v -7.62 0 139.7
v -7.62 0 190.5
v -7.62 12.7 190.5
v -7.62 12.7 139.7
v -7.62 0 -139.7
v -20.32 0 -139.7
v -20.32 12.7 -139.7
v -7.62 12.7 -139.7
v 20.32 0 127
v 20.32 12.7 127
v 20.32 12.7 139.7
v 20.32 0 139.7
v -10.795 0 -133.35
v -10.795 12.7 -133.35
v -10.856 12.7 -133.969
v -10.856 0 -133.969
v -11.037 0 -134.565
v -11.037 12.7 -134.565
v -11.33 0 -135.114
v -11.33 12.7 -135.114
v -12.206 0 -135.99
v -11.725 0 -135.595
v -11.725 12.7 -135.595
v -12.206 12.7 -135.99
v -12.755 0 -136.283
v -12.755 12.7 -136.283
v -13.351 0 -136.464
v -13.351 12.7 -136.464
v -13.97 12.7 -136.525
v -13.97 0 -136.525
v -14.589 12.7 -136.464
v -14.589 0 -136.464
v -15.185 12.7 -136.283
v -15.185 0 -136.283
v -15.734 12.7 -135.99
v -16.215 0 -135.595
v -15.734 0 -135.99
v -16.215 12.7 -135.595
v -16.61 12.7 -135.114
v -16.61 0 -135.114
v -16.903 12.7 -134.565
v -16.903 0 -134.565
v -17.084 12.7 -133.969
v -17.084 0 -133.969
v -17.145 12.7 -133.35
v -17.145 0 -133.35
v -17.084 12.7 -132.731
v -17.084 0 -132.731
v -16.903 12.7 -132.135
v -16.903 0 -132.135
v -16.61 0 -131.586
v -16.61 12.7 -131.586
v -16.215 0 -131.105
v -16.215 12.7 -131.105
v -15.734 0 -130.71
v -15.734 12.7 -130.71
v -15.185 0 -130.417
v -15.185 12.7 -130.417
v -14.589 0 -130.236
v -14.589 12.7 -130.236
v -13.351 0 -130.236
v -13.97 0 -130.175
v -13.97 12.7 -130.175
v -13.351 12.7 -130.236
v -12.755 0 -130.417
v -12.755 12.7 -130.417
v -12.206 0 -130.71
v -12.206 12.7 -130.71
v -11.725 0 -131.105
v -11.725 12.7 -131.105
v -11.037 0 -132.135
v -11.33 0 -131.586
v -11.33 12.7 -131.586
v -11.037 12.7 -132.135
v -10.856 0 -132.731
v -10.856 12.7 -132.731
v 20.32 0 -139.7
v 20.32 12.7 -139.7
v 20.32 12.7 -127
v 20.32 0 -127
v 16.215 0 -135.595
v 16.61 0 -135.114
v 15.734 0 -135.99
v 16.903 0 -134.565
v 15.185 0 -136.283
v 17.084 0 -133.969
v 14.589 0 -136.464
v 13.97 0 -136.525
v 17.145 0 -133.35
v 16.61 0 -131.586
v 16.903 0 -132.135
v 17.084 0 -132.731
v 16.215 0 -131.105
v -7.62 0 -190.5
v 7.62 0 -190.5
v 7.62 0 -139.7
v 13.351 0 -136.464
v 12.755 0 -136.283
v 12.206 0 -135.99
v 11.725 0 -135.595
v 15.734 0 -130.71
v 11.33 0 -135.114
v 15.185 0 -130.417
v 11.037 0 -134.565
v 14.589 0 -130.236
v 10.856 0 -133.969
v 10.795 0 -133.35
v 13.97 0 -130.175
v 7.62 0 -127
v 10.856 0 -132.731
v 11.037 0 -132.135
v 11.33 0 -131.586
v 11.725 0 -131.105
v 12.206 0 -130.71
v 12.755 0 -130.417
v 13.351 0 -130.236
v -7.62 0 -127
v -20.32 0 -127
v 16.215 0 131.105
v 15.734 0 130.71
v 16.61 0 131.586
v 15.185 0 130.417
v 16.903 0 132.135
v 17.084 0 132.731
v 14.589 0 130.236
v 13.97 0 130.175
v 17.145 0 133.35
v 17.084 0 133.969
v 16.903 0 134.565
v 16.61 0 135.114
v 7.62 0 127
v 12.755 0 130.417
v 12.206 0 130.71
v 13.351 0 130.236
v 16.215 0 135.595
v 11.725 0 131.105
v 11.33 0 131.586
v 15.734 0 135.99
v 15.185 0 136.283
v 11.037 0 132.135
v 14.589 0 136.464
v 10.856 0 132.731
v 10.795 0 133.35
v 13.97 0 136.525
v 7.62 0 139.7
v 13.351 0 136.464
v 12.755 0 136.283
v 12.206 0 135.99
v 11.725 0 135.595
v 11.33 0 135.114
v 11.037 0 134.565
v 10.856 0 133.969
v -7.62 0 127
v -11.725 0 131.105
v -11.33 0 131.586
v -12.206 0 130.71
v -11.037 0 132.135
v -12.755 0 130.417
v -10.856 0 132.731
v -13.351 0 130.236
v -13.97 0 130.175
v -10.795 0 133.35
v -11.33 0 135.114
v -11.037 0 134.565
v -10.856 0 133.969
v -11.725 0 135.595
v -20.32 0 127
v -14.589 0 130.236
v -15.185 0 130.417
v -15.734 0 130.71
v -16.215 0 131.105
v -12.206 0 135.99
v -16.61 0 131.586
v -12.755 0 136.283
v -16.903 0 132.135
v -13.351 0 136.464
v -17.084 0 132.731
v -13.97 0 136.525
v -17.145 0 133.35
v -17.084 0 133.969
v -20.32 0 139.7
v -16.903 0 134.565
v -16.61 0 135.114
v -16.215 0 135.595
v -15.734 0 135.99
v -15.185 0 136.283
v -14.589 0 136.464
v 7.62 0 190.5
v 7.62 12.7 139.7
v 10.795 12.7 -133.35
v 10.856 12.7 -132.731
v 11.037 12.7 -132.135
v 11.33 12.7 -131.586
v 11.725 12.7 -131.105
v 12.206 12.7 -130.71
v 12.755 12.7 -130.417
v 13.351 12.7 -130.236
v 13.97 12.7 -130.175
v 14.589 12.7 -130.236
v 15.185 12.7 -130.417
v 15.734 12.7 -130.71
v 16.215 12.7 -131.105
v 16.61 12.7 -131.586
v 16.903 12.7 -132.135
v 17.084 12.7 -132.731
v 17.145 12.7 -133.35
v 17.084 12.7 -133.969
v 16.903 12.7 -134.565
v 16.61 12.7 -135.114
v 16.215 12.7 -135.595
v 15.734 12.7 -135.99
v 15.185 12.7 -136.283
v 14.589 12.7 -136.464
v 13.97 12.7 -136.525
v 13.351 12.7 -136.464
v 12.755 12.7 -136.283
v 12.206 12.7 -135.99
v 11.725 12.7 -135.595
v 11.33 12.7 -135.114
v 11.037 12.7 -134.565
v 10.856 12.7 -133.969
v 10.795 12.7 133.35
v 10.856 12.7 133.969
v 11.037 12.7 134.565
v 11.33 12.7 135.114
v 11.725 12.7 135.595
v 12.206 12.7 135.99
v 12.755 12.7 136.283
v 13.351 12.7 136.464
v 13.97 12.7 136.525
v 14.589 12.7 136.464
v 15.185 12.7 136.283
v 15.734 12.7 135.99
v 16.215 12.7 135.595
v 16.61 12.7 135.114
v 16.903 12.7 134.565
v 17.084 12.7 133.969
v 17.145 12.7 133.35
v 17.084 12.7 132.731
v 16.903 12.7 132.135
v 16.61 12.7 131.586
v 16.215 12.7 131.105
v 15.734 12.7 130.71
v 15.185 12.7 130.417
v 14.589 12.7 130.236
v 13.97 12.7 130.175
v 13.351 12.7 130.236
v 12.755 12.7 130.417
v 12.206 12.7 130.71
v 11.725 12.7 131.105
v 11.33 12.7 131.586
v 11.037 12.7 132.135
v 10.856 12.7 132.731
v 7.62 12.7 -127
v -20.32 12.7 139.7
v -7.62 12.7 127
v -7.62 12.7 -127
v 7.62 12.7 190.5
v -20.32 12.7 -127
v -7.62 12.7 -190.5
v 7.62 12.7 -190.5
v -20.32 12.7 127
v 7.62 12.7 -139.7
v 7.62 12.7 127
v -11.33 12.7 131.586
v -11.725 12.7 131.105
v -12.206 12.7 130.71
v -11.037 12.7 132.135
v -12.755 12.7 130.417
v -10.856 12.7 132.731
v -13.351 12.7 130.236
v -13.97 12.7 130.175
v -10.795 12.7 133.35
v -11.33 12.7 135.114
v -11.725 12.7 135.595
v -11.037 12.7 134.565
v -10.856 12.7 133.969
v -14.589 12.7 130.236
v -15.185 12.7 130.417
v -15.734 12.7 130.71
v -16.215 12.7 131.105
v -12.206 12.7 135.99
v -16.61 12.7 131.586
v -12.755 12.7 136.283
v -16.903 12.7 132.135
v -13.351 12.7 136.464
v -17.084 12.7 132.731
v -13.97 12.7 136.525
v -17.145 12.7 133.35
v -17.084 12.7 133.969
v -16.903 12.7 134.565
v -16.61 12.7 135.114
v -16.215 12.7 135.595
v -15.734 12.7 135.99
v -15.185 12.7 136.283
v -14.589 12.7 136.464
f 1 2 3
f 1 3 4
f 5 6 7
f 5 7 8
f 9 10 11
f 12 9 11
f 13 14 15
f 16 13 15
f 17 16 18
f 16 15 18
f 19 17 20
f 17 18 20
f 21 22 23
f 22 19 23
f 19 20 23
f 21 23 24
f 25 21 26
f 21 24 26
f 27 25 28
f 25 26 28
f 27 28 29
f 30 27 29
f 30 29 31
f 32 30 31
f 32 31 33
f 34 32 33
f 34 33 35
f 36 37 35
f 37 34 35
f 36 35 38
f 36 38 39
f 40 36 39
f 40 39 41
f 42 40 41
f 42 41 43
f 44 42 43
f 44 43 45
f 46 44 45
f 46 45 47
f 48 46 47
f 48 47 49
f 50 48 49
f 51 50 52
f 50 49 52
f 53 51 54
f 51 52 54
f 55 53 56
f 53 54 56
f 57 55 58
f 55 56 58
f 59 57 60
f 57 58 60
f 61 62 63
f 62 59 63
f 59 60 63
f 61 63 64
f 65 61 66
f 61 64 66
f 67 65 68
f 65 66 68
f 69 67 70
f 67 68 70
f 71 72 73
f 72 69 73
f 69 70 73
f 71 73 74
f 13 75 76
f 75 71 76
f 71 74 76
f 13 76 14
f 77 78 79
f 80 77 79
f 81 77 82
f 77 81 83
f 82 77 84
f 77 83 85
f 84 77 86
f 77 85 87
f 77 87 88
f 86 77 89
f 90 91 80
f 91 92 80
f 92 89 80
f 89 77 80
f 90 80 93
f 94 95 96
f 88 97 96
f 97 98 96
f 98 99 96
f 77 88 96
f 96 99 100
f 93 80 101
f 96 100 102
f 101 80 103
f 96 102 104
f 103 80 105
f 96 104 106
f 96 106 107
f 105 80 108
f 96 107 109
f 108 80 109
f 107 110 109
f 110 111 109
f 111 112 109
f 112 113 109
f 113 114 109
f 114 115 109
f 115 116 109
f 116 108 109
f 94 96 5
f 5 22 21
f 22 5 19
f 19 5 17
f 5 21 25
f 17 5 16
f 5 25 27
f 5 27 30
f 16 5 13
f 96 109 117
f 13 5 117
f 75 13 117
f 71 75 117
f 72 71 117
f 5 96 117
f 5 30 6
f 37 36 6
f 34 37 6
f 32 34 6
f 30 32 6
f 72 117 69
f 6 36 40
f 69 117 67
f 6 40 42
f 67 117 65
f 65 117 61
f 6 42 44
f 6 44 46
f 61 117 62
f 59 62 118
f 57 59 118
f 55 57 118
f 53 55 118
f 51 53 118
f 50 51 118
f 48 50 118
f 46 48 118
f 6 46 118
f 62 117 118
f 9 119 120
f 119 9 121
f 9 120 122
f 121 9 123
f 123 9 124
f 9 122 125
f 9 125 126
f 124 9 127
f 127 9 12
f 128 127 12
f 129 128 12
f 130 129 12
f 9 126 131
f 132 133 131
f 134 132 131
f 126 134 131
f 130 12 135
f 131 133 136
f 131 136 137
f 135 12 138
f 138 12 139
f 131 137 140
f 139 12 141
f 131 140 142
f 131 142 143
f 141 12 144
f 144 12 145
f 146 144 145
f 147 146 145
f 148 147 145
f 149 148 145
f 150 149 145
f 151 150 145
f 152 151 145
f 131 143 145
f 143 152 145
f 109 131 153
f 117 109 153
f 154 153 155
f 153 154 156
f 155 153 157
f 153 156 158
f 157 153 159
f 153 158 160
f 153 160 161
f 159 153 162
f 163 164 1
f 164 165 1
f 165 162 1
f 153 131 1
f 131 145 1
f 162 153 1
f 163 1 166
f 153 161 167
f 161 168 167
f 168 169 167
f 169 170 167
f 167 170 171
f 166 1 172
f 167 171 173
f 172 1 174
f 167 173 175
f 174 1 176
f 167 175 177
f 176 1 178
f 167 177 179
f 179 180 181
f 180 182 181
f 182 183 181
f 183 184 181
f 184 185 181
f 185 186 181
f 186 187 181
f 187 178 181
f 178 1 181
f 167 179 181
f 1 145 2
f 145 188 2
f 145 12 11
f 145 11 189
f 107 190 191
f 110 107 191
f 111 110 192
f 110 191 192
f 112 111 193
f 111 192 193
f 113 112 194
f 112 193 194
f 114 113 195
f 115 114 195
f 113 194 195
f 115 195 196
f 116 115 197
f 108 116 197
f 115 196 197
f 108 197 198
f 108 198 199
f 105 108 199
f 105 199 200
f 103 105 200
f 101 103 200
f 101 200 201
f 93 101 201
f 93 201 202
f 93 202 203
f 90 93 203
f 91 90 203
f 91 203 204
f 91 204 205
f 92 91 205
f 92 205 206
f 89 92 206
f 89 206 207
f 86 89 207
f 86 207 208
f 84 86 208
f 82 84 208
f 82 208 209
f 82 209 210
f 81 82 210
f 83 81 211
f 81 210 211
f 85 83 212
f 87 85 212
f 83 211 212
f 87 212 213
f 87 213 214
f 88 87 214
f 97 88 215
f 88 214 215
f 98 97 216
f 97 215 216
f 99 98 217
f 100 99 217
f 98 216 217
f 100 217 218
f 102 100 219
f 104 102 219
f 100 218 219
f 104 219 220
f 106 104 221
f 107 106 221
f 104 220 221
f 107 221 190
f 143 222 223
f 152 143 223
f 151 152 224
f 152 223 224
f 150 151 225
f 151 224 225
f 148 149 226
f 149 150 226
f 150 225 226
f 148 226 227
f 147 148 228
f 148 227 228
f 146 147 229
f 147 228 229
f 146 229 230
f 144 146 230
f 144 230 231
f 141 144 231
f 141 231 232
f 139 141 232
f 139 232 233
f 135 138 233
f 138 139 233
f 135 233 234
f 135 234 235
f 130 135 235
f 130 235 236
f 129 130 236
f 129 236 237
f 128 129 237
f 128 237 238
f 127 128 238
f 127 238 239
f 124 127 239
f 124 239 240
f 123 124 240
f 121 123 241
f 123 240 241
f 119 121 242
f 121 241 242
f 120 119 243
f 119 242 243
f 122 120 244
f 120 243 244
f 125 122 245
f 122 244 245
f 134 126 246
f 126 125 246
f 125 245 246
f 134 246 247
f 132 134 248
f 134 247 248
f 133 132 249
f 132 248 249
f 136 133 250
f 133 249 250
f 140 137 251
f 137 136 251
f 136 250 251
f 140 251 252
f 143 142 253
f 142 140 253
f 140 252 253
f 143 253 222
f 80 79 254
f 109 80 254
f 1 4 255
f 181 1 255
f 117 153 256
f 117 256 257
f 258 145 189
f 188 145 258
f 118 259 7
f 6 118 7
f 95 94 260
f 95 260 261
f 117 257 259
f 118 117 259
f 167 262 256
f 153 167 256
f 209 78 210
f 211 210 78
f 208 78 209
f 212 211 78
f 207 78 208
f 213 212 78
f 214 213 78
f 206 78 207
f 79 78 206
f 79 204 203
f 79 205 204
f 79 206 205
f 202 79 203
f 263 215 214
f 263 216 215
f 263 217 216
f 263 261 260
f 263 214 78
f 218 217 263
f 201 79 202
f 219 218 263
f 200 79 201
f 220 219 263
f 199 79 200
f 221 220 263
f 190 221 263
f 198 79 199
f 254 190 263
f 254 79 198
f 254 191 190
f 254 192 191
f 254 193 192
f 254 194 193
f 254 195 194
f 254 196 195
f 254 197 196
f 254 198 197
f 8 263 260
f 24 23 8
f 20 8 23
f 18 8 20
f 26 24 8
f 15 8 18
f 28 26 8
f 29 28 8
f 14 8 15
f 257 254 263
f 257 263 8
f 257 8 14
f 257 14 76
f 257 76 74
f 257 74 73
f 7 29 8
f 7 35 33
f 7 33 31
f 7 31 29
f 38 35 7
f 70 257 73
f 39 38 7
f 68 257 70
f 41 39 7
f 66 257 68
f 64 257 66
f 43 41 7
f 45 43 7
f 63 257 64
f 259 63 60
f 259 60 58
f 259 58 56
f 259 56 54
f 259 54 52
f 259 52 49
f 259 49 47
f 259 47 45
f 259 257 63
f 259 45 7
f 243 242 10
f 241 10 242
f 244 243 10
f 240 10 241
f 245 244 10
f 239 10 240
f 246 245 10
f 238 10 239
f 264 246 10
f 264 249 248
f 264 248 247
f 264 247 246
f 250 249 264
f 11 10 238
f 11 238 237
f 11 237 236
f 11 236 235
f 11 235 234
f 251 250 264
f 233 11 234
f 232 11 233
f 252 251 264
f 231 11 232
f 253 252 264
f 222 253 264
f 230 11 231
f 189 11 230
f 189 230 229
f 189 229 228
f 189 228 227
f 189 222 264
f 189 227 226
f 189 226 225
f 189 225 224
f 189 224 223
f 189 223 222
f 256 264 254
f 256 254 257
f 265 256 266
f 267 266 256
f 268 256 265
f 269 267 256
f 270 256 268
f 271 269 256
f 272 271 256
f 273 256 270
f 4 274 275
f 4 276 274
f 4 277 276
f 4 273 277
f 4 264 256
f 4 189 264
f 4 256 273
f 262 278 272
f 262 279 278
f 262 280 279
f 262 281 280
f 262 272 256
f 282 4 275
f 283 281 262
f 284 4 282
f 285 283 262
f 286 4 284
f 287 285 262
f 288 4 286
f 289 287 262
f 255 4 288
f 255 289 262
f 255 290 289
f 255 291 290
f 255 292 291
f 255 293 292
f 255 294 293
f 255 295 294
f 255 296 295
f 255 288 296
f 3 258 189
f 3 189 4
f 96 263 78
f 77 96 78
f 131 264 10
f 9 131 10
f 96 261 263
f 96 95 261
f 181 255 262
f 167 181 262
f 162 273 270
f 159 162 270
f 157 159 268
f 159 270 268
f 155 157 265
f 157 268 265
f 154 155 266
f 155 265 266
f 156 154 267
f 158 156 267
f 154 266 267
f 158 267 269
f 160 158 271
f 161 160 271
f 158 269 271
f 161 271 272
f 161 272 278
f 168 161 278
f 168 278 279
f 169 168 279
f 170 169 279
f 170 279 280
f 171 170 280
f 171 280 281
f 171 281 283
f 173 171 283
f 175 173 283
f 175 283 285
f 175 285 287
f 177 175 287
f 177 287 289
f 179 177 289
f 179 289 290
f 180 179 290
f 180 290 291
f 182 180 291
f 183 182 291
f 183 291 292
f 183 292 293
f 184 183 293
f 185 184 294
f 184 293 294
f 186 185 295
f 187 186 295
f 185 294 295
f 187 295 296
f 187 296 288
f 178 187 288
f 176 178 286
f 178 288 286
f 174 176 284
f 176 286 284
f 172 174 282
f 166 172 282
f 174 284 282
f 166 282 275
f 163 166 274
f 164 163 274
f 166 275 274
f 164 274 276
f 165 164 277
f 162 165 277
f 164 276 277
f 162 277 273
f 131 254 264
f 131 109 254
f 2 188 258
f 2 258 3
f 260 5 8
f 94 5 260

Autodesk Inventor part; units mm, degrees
ref_plane "YZ Plane" through (0, 0, 0) normal (1, 0, 0) x (0, 1, 0)
ref_plane "XZ Plane" through (0, 0, 0) normal (0, 1, 0) x (-1, 0, 0)
ref_plane "XY Plane" through (0, 0, 0) normal (0, 0, 1) x (1, 0, 0)
sketch "Sketch1" plane through (0, 0, 0) normal (0, 1, 0) x (-1, 0, 0)
  line L0 (-7.62, 190.5) -> (7.62, 190.5)
  line L1 (7.62, 190.5) -> (7.62, -190.5)
  line L2 (7.62, -190.5) -> (-7.62, -190.5)
  line L3 (-7.62, -190.5) -> (-7.62, 190.5)
  line L4 (-7.62, 190.5) -> (7.62, -190.5) construction
  line L5 (7.62, 190.5) -> (-7.62, -190.5) construction
  point P0 (0, 0)
  dimension "d0" = 15.24
  dimension "d1" = 381
extrude "Extrusion1" add sketch "Sketch1" along normal blind 12.7
sketch "Sketch2" plane through (0, 12.7, 0) normal (0, 1, 0) x (1, 0, 0)
  line L0 (-7.62, 190.5) -> (-7.62, -190.5) projected
  line L1 (-7.62, -139.7) -> (-20.32, -139.7)
  line L2 (-20.32, -139.7) -> (-20.32, -127)
  line L3 (-20.32, -127) -> (-7.62, -127)
  line L4 (-7.62, -127) -> (-7.62, -139.7)
  circle A0 centre (-13.97, -133.35) radius 3.175
  point P0 (0, 0)
  dimension "d4" = 12.7
  dimension "d5" = 12.7
  dimension "d6" = 127
  dimension "d7" = 6.35
  dimension "d8" = 6.35
  dimension "d9" = 6.35
extrude "Extrusion2" add sketch "Sketch2" against normal up to surface (12.7 mm away)
mirror "Mirror1" about plane through (0, 0, 0) normal (1, 0, 0) of "Extrusion2"
mirror "Mirror2" about plane through (0, 0, 0) normal (0, 0, 1) of "Extrusion2", "Mirror1"
equation "\"d8\" = 0.5 * d4"
equation "\"d9\" = 0.5 * d5"
properties part number "Rack Bottom"
